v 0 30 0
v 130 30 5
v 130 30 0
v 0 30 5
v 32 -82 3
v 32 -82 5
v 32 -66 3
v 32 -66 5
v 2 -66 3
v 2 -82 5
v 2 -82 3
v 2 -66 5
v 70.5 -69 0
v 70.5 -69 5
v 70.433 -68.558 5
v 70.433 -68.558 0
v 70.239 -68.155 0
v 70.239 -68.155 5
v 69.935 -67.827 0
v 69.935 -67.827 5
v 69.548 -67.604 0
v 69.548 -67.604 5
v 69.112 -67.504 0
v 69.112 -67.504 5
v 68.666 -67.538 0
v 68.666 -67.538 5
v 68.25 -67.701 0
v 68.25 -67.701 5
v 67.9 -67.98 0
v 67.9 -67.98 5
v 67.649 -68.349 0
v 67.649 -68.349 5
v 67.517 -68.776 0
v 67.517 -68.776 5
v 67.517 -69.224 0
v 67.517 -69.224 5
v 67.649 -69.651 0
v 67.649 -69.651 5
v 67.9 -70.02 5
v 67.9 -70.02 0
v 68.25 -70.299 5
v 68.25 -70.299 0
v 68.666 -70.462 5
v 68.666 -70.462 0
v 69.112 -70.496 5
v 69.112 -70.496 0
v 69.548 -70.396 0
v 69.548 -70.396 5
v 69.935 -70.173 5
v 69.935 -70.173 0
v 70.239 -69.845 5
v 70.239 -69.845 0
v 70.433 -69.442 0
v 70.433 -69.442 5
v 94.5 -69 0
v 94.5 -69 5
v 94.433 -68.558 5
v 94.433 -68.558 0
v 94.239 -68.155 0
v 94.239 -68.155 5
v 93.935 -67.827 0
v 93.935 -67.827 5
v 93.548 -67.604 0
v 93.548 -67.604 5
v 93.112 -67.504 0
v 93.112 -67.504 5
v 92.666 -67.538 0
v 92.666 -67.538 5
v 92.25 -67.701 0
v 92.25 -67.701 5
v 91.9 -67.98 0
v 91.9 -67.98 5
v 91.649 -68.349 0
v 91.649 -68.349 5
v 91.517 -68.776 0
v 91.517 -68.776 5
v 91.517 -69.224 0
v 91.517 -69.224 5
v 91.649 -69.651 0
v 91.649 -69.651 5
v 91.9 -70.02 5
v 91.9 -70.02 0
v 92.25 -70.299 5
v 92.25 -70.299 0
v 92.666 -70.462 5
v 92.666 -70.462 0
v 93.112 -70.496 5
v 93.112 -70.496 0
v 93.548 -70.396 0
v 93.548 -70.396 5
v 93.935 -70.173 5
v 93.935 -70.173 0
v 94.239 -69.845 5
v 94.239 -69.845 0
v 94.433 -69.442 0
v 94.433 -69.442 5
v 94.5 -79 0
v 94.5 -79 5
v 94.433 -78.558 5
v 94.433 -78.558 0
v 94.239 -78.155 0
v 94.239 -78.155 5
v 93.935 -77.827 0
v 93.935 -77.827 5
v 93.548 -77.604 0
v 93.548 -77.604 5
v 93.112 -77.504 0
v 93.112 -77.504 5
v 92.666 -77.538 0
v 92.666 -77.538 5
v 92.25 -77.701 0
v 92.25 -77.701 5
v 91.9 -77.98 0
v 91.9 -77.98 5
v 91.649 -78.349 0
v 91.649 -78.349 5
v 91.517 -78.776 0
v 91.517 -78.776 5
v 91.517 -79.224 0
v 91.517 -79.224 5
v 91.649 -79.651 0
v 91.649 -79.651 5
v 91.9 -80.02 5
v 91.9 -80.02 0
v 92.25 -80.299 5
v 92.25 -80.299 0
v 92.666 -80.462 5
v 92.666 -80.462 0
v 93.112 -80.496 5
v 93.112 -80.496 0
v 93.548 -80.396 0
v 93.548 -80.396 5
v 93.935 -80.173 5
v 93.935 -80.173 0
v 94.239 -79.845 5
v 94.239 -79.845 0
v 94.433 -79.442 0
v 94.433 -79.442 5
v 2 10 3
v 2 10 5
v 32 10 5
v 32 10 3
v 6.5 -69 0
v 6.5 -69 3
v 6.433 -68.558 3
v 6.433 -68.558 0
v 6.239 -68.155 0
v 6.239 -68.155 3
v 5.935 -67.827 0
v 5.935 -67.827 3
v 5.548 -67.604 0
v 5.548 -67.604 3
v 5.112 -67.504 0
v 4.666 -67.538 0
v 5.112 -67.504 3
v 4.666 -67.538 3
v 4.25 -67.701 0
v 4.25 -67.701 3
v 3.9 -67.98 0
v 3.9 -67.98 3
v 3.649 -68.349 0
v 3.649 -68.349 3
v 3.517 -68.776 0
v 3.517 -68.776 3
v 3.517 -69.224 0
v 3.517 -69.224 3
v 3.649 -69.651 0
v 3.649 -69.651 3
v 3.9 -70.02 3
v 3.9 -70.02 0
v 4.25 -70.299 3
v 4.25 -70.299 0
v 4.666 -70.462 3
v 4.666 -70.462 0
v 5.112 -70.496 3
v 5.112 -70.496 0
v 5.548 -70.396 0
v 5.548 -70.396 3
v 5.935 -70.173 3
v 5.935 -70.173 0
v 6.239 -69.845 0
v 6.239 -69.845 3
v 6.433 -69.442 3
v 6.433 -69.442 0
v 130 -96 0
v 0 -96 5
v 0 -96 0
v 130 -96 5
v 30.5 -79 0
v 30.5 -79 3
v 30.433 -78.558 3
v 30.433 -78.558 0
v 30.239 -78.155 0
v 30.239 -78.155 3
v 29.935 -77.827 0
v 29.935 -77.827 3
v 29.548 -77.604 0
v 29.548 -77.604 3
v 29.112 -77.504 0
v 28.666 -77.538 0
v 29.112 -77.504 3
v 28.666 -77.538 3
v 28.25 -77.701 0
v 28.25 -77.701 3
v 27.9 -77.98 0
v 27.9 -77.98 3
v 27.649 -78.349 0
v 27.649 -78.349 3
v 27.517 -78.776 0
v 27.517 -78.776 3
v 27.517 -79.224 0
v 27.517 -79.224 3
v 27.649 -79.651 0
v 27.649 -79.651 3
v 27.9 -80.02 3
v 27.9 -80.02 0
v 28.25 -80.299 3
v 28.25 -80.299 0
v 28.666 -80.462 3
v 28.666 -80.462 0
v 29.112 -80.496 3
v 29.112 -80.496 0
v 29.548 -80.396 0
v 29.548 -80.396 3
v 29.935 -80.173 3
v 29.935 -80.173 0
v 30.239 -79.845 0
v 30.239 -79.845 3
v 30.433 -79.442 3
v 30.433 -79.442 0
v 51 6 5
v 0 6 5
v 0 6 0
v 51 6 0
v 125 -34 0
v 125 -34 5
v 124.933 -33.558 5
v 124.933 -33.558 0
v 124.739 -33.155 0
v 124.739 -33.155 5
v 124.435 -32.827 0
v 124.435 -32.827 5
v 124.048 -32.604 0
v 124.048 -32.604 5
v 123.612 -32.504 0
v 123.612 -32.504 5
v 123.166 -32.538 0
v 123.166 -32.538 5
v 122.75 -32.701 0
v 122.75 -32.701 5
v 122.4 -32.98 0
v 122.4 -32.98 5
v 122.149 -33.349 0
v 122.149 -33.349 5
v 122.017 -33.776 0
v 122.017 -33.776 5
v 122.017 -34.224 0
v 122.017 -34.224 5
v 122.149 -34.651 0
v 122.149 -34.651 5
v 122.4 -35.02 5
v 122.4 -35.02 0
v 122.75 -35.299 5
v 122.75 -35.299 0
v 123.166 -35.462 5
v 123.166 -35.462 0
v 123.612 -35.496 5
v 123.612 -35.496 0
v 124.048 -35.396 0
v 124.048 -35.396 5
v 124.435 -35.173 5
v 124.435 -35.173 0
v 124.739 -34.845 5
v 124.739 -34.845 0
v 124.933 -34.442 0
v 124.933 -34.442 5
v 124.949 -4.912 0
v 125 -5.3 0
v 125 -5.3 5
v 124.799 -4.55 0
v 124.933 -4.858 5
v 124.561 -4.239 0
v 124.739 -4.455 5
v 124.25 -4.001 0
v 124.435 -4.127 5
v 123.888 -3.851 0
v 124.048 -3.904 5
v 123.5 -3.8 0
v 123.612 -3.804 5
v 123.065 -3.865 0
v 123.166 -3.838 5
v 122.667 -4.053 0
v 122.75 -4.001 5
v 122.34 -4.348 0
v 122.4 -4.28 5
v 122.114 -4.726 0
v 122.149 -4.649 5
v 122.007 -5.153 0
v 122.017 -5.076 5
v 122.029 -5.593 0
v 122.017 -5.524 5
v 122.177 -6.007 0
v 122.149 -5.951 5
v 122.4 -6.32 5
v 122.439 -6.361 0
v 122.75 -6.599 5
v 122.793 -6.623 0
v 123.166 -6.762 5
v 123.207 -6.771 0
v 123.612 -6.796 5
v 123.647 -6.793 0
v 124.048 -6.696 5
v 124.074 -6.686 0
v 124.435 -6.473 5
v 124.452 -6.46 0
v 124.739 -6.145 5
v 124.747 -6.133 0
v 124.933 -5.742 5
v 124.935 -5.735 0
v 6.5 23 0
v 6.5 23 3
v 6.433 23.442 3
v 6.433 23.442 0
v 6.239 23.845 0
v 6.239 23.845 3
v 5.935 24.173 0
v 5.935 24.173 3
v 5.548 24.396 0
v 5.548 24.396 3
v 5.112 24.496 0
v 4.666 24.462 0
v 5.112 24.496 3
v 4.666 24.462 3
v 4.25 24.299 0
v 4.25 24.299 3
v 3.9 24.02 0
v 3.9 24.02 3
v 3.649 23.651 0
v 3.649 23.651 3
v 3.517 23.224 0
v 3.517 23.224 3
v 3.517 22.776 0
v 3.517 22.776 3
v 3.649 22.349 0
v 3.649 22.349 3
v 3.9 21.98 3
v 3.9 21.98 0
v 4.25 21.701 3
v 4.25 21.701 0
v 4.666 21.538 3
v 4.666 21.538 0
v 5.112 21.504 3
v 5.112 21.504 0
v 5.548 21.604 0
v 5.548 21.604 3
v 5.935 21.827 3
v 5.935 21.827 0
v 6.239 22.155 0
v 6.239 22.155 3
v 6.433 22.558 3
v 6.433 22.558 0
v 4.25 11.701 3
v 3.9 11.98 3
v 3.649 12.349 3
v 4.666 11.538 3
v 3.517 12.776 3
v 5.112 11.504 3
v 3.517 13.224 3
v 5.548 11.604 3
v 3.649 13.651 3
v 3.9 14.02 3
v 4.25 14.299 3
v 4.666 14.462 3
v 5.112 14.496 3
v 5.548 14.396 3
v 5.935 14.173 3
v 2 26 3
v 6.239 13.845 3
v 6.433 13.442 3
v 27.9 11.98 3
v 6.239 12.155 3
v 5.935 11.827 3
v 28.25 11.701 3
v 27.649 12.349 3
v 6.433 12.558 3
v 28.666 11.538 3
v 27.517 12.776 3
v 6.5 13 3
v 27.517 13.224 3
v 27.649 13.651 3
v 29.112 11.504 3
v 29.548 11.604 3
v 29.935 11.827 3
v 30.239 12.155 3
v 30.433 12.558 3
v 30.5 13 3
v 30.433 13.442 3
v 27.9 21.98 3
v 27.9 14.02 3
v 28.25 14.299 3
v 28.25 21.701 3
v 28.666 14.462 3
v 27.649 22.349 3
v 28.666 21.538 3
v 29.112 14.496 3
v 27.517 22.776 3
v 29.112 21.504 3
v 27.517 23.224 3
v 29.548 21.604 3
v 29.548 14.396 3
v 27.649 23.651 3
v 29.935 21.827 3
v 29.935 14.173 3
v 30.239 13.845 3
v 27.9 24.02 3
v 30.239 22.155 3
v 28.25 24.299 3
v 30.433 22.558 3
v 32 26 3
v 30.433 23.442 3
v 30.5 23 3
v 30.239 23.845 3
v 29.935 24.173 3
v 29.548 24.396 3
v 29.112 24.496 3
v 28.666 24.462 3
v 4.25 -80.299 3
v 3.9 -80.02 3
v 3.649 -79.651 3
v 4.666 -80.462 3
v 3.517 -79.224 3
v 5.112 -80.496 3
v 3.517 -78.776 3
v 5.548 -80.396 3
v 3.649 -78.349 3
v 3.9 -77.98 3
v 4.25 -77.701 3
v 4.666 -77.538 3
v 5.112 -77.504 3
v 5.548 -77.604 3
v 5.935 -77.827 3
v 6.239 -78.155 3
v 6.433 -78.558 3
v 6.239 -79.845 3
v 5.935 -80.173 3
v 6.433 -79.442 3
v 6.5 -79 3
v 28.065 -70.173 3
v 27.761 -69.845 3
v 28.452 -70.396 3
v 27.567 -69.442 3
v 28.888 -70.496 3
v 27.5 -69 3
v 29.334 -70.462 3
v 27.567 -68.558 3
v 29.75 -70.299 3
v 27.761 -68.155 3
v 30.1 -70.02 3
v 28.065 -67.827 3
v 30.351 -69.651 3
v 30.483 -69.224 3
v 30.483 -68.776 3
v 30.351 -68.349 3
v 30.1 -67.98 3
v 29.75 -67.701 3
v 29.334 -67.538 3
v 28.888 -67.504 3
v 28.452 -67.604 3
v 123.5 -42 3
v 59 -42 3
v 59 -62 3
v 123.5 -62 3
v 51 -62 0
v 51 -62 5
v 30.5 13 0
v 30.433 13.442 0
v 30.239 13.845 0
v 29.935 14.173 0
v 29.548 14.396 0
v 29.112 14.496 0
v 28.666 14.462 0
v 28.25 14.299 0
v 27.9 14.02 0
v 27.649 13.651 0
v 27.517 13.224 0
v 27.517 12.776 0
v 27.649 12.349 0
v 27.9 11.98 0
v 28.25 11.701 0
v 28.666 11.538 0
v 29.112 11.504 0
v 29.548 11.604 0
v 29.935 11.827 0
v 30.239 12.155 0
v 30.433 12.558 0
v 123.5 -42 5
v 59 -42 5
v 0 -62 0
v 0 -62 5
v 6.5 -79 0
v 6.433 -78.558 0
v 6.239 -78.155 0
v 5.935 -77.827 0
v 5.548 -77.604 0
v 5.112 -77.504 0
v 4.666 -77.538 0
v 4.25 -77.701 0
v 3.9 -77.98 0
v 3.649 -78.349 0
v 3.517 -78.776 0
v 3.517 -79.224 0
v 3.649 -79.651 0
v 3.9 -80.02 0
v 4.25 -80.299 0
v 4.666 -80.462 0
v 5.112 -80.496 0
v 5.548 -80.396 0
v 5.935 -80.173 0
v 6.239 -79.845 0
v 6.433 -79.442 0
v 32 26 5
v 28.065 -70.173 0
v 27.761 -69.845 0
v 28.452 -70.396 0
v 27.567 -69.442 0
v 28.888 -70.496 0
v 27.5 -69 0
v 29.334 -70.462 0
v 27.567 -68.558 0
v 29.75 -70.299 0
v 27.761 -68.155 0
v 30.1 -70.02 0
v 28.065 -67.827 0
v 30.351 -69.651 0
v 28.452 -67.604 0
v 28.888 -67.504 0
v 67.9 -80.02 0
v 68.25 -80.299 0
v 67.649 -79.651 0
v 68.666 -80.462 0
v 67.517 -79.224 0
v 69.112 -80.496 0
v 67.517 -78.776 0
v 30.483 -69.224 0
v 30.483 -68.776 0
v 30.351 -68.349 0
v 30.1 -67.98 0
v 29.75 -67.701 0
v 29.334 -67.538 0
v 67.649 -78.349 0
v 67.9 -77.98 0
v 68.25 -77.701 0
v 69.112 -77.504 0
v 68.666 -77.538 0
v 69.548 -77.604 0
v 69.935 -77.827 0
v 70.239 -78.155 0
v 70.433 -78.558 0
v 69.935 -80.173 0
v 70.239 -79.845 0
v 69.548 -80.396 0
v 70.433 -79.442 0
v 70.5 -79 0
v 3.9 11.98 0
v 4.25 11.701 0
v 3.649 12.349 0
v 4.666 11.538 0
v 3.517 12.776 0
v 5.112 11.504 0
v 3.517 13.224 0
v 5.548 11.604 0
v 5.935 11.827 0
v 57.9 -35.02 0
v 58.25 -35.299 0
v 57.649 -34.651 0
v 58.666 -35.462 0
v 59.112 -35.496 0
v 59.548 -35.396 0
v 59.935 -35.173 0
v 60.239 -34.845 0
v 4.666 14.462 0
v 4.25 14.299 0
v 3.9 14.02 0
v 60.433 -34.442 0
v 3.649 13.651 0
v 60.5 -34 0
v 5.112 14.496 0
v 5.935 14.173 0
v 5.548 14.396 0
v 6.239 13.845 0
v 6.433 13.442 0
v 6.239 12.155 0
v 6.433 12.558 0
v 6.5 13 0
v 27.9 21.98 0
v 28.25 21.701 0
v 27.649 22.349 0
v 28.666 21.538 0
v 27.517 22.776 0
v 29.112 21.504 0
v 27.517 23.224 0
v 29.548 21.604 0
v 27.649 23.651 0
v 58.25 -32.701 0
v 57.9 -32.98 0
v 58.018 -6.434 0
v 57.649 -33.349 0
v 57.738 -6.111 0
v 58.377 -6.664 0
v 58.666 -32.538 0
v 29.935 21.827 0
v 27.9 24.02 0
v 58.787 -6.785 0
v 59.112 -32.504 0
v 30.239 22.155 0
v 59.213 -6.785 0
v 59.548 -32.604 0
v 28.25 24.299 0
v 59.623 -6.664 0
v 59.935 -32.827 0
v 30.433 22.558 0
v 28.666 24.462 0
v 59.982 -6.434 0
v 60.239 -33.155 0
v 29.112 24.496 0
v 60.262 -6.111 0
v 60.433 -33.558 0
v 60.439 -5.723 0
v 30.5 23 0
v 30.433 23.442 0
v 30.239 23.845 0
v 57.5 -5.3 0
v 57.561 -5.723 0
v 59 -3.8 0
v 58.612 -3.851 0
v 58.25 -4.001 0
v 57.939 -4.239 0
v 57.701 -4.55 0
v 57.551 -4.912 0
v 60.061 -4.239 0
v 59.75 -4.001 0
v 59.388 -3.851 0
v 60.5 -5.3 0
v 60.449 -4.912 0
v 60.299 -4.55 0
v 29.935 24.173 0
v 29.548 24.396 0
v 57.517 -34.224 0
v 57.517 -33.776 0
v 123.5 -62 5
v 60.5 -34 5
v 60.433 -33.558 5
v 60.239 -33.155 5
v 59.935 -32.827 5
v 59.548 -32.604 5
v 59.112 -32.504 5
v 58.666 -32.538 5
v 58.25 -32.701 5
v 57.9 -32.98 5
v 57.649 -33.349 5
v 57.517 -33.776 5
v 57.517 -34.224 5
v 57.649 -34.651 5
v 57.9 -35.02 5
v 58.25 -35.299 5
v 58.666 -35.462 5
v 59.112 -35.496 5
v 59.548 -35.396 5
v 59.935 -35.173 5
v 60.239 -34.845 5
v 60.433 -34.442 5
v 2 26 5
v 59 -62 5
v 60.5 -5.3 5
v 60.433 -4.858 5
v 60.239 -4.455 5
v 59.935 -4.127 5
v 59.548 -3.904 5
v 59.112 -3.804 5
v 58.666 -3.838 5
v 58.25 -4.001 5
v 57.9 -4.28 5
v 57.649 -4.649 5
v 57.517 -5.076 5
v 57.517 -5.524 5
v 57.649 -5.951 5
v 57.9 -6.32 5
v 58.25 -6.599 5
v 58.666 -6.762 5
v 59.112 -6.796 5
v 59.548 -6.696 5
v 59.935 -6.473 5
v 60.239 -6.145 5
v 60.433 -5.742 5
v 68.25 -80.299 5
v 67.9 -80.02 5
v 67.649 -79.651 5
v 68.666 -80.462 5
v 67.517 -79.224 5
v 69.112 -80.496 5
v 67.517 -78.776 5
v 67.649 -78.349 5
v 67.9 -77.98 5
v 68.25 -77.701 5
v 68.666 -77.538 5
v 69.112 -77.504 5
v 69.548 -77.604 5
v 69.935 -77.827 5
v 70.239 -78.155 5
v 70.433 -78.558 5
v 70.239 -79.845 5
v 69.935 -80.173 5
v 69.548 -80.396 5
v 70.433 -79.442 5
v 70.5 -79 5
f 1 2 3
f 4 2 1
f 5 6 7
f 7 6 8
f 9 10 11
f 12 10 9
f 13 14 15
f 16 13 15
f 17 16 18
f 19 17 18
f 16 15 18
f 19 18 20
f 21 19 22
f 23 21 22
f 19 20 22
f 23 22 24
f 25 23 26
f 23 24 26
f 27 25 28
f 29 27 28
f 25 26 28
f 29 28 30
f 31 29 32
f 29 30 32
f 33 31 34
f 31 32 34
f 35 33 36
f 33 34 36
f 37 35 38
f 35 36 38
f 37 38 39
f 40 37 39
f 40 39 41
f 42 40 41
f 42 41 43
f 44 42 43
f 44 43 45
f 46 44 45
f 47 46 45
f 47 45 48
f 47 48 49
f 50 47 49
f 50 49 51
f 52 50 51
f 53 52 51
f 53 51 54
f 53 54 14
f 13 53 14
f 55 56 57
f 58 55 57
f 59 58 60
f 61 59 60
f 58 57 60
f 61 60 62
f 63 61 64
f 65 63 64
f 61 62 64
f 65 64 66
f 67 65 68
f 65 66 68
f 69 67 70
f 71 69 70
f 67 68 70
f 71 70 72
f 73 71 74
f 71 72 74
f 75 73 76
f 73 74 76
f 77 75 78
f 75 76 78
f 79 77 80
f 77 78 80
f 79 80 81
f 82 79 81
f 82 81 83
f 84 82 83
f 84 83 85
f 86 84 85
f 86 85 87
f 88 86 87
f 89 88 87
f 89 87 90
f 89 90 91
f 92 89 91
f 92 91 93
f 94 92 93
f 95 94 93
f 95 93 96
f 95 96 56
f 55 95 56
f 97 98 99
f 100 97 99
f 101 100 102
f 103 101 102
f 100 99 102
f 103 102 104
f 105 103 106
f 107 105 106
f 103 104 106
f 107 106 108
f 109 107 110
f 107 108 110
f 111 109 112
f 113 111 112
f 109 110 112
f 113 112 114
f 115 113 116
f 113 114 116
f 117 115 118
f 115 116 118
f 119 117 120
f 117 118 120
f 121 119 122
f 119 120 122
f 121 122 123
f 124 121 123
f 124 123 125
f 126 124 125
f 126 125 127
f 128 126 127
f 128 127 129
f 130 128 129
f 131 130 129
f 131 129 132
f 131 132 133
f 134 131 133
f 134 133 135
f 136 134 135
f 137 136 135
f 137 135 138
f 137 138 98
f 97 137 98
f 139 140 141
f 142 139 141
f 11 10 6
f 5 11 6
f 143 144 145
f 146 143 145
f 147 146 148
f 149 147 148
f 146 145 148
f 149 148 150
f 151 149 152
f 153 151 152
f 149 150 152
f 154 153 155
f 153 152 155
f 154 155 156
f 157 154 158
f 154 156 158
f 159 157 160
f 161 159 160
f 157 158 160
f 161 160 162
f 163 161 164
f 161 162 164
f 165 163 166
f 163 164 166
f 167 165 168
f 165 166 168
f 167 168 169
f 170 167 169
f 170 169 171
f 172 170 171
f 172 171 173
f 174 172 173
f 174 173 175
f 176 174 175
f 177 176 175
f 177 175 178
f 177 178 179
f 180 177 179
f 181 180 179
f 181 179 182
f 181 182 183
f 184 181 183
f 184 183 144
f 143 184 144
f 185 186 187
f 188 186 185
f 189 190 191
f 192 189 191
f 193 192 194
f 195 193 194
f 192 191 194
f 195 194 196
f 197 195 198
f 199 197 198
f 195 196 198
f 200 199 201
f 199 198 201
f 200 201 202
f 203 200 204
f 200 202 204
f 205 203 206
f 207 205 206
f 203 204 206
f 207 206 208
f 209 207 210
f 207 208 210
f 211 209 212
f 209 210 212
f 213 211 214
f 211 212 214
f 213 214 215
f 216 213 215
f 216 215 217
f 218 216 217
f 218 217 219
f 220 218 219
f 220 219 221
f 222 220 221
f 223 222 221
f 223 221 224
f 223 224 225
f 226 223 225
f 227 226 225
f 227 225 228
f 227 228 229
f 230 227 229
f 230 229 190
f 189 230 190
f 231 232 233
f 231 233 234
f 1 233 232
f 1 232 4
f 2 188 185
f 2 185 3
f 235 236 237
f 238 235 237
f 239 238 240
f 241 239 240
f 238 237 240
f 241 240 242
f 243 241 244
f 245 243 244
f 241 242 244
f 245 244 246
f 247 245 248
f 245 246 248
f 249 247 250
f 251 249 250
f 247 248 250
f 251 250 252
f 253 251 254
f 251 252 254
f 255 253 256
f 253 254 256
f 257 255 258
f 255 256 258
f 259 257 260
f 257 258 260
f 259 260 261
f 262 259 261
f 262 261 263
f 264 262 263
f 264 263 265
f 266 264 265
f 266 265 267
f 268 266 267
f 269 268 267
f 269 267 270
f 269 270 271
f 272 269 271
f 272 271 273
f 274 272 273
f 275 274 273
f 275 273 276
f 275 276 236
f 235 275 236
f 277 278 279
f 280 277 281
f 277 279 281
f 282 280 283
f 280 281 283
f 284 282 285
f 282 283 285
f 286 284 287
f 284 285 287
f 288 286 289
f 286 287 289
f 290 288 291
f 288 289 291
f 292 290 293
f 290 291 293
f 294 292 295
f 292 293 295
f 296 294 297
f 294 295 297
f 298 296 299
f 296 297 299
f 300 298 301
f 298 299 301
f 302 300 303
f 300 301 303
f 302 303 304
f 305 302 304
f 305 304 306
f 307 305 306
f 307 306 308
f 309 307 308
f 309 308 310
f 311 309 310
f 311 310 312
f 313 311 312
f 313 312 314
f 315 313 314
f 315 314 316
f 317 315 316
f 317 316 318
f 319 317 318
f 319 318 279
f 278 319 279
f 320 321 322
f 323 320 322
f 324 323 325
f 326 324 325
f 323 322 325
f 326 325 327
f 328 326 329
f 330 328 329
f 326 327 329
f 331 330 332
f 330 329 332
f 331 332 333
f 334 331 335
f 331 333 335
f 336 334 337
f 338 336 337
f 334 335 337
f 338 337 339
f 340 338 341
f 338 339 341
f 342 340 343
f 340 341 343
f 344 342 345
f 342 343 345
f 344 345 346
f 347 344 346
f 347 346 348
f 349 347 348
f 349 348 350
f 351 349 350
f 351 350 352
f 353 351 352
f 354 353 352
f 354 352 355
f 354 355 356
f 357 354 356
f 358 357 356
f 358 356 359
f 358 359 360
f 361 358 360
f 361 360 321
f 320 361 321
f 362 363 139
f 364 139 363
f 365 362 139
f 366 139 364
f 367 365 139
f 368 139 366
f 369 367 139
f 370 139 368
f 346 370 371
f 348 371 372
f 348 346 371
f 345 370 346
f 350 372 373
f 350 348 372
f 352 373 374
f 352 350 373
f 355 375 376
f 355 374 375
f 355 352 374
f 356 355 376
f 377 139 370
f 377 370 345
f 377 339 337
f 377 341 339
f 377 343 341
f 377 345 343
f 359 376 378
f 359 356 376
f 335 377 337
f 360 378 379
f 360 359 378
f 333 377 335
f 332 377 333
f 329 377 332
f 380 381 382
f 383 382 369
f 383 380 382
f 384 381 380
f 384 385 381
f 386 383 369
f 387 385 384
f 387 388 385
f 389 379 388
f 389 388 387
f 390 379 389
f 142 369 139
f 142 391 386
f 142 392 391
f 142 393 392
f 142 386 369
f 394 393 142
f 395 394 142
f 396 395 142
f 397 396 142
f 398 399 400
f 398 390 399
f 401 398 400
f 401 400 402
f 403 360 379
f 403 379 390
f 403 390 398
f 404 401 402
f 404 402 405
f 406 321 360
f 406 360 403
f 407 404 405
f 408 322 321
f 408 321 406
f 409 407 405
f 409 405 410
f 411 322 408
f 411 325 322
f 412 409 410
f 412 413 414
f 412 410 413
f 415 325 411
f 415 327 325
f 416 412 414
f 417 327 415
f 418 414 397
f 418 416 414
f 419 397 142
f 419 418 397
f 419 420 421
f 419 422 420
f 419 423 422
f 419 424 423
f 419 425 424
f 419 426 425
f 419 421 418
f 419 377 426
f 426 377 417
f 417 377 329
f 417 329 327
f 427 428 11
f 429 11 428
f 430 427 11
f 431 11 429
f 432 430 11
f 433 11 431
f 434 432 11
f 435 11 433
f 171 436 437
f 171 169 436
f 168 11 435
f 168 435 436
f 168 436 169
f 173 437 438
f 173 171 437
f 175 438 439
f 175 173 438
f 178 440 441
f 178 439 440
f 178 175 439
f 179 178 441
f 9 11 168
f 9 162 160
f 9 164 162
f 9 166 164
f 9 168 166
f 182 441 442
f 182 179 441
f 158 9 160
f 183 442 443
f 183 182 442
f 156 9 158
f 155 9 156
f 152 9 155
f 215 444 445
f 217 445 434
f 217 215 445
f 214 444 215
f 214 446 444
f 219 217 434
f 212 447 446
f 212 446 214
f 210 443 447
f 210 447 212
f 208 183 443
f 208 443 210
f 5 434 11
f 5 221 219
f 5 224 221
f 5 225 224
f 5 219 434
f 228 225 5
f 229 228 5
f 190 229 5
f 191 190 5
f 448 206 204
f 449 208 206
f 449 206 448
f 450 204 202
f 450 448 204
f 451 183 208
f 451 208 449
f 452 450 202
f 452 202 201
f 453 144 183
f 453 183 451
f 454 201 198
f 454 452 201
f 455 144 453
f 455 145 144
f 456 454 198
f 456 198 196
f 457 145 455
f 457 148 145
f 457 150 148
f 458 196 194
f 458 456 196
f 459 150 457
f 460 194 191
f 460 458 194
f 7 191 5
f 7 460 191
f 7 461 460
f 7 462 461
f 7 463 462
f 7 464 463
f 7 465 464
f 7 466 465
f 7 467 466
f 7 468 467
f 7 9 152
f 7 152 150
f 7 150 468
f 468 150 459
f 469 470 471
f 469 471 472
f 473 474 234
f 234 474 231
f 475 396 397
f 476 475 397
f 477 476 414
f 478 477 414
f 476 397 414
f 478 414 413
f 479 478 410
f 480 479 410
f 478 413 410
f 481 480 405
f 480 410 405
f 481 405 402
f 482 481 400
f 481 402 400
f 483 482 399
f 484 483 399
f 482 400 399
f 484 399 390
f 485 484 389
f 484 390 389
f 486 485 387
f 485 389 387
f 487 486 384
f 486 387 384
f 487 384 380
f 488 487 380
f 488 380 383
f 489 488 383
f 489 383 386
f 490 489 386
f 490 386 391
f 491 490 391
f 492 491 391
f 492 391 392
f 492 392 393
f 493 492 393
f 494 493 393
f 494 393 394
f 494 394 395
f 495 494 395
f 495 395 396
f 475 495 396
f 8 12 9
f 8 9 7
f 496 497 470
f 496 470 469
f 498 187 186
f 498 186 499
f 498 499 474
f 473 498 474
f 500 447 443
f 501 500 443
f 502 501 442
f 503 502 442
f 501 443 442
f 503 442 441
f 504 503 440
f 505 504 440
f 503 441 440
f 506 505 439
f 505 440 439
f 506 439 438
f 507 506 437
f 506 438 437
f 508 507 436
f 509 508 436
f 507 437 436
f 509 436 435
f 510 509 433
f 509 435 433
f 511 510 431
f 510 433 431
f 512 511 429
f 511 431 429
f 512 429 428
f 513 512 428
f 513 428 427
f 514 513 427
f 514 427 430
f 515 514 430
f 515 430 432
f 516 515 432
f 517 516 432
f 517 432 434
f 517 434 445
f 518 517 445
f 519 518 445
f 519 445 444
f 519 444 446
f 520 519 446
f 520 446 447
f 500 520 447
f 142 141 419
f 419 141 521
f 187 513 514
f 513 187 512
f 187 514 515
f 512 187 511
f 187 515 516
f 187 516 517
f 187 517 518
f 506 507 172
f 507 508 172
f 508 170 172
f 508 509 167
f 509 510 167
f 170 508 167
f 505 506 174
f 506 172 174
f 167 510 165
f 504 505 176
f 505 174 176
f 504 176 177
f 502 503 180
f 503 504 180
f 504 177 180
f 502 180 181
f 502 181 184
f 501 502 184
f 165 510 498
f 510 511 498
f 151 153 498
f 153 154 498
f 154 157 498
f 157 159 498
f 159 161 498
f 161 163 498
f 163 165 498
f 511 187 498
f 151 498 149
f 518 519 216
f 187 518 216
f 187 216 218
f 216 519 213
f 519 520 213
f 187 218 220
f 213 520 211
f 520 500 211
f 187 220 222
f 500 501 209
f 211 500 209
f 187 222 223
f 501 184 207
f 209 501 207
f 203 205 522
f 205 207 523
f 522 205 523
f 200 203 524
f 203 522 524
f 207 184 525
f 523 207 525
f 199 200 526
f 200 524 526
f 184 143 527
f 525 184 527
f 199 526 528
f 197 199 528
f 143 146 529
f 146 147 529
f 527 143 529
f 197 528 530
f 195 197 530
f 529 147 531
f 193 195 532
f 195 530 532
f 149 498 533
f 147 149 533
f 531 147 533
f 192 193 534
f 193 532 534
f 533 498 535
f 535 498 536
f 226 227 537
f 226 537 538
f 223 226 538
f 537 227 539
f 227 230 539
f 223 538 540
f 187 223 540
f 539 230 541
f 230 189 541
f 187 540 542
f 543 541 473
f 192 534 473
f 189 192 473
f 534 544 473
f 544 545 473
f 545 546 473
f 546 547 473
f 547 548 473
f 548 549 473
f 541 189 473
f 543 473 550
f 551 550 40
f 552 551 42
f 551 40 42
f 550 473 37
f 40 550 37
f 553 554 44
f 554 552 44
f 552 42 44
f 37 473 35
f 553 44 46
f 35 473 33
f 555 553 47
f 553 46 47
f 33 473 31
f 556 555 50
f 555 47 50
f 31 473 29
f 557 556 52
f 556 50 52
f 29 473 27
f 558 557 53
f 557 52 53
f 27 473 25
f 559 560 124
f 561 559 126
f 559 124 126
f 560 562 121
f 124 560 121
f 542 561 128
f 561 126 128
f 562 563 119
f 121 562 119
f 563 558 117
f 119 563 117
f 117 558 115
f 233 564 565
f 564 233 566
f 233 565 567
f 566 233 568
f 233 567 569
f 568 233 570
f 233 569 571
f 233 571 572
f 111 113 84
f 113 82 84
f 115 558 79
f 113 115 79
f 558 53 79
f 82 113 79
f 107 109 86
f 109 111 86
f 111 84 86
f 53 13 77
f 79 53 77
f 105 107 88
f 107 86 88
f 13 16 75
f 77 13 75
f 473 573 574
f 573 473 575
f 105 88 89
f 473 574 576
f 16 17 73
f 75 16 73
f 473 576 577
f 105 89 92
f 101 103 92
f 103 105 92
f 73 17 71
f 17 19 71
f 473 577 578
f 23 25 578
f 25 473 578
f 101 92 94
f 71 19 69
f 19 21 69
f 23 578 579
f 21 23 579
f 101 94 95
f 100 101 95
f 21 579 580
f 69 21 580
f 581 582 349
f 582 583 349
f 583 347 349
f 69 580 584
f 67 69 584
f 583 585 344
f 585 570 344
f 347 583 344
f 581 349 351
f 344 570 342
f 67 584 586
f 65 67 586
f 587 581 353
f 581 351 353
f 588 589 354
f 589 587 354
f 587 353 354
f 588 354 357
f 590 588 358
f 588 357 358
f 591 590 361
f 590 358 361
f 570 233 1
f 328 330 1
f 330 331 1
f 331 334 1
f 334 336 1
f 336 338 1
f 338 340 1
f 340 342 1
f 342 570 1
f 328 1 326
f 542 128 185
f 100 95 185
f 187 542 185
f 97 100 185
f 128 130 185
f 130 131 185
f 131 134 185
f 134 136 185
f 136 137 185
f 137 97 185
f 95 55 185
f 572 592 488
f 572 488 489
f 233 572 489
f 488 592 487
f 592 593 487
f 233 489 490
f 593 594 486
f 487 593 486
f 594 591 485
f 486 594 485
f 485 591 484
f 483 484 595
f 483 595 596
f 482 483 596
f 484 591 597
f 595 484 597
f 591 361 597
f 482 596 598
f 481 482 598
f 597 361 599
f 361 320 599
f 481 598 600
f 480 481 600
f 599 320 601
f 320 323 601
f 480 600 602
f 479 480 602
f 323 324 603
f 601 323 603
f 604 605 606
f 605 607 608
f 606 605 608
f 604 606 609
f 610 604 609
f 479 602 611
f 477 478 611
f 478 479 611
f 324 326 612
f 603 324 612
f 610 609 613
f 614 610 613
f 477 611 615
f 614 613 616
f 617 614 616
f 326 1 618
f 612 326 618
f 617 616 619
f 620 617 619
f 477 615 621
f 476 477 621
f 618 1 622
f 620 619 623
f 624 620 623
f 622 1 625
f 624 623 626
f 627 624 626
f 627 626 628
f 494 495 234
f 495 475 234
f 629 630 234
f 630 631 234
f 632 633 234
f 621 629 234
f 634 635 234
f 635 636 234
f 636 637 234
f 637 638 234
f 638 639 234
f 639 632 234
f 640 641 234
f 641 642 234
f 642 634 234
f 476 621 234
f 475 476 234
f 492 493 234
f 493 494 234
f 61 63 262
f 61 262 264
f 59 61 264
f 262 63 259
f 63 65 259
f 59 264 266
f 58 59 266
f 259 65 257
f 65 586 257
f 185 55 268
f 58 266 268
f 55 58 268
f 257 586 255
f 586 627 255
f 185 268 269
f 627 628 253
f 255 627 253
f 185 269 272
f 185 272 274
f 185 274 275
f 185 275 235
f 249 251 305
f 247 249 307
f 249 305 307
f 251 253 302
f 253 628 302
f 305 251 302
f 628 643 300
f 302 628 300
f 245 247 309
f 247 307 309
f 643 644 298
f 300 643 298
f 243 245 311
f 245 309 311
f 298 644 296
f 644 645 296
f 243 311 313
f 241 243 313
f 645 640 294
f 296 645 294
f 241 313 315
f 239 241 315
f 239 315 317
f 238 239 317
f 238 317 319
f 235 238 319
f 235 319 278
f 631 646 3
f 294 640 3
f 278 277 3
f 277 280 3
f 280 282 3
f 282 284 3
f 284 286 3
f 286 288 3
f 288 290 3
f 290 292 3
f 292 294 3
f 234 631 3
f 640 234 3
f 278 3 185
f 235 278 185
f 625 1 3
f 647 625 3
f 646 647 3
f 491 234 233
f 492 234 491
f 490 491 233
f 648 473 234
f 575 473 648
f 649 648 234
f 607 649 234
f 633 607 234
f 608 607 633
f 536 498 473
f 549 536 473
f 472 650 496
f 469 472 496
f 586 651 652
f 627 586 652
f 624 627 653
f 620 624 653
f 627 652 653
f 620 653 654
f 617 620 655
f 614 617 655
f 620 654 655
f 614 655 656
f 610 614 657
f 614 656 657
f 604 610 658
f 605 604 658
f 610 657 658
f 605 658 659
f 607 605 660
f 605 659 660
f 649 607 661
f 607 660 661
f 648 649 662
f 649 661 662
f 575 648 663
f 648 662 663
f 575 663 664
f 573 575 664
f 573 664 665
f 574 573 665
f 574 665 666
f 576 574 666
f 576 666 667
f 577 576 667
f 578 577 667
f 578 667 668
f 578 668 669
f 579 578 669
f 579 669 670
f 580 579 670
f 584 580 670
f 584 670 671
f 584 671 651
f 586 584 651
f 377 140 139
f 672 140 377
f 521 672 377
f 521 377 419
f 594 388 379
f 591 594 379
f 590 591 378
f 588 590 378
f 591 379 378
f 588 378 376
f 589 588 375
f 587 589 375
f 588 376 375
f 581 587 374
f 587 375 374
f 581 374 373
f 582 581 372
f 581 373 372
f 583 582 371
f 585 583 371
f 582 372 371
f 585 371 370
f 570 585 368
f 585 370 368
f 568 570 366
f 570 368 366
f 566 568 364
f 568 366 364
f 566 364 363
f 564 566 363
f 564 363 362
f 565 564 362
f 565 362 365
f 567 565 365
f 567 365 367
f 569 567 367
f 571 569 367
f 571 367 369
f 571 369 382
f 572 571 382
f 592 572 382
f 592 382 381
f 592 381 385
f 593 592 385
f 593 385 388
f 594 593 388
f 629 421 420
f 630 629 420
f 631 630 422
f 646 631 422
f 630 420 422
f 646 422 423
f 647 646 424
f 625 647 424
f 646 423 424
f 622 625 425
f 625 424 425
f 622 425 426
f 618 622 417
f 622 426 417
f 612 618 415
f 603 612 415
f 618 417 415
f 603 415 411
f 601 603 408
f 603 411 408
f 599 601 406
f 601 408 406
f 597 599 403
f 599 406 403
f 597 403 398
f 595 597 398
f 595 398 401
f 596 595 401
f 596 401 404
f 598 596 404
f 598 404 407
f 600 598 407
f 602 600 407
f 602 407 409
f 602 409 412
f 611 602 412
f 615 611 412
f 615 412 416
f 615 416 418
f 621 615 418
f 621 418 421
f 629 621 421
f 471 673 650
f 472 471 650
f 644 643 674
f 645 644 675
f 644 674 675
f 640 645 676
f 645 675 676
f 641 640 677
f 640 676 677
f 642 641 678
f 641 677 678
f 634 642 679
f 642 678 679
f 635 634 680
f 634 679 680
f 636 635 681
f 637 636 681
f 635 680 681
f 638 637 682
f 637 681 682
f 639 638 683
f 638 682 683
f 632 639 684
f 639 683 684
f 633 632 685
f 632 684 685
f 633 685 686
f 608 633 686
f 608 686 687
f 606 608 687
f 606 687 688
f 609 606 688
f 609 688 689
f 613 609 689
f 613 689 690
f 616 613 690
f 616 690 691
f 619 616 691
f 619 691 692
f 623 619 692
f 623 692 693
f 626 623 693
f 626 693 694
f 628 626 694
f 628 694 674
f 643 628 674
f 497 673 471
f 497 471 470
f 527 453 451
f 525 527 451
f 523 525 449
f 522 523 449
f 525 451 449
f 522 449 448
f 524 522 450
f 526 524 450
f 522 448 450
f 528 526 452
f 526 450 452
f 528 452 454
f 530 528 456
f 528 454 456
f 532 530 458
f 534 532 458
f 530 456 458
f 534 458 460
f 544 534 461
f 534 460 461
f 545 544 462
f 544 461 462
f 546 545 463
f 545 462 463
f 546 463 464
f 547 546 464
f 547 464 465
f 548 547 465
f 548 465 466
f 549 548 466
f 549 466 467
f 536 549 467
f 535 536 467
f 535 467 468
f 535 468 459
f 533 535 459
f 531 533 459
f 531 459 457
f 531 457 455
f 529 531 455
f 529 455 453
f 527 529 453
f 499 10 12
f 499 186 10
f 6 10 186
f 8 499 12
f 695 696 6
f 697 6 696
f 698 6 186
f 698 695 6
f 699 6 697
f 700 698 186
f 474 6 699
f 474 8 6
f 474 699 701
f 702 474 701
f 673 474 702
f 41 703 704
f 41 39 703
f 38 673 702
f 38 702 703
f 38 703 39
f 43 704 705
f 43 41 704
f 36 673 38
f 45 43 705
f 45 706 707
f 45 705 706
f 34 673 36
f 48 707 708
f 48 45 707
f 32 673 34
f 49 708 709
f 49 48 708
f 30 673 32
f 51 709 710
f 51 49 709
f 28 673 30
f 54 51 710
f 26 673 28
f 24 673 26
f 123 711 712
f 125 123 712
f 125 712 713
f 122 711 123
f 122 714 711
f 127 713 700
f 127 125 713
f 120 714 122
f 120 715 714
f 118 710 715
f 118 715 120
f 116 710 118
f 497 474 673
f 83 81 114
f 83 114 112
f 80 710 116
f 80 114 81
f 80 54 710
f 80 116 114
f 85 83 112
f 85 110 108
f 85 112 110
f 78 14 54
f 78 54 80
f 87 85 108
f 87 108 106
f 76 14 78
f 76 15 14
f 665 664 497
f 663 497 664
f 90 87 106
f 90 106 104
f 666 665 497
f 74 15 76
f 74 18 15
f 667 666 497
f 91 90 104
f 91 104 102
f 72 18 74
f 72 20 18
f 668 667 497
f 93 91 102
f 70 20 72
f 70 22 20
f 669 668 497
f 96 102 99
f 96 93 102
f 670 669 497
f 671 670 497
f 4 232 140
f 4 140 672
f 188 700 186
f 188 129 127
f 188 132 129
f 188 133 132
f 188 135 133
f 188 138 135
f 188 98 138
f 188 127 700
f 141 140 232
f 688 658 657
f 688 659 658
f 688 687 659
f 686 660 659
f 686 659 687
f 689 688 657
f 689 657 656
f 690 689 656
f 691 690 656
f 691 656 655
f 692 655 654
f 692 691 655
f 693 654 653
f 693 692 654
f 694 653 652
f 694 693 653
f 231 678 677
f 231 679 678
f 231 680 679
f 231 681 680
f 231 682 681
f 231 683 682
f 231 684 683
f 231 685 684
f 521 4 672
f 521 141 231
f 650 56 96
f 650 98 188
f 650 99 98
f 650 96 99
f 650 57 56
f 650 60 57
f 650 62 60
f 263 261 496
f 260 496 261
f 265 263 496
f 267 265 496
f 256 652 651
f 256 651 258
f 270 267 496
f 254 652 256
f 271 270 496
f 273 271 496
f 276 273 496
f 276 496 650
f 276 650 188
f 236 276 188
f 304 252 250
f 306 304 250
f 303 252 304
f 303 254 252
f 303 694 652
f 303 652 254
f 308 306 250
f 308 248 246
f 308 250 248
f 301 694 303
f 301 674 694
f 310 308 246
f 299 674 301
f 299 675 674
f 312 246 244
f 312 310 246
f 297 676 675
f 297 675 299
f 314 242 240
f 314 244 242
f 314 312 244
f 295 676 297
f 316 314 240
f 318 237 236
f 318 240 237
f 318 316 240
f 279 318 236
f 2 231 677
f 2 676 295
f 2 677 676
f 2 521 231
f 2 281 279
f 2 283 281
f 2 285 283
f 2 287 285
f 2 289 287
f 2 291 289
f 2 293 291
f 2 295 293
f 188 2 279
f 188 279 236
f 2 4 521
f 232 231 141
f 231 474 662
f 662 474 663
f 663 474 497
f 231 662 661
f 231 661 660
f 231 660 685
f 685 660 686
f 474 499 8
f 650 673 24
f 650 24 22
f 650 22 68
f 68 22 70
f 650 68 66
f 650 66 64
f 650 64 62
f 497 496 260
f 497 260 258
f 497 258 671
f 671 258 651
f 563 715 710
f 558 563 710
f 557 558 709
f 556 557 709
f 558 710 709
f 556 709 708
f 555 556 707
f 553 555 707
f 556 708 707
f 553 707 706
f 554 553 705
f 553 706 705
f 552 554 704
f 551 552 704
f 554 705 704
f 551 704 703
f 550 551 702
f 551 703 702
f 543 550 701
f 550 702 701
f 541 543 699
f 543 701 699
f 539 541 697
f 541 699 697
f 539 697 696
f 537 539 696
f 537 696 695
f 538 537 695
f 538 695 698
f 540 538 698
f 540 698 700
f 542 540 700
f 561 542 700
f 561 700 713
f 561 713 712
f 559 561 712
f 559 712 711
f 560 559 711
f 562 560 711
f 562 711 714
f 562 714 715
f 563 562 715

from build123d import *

# Parameters (mm, degrees)
EXTRUDE_2_DEPTH      = 5
SKETCH_3_W           = 30
SKETCH_3_H           = 16.1
CUT_EXTRUDE_1_DEPTH  = 2
CUT_EXTRUDE_2_REACH  = 155.704
SKETCH_4_R           = 1.55
CUT_EXTRUDE_3_REACH  = 155.756
SKETCH_5_W           = 32
SKETCH_5_H           = 56
SKETCH_7_W           = 40.5
SKETCH_7_H           = 40.5
EXTRUDE_4_DEPTH      = 2
SKETCH_8_W           = 30.5
SKETCH_8_H           = 16.5
CUT_EXTRUDE_4_DEPTH  = 2
SKETCH_9_R           = 1.55
CUT_EXTRUDE_6_DEPTH  = 154.727030805
SKETCH_10_W          = 60
SKETCH_10_H          = 45
EXTRUDE_5_DEPTH      = 2
SKETCH_11_W          = 60
SKETCH_11_H          = 45
CUT_EXTRUDE_8_DEPTH  = 2
SKETCH_12_W          = 30
SKETCH_12_H          = 16.1
SKETCH_12_W_2        = 30.5
SKETCH_12_H_2        = 16.5
EXTRUDE_6_DEPTH      = 5
SKETCH_13_R          = 1.5
CUT_EXTRUDE_10_DEPTH = 5
SKETCH_14_W          = 30
SKETCH_14_H          = 16
CUT_EXTRUDE_11_DEPTH = 2
SKETCH_15_W          = 53
SKETCH_15_H          = 60
SKETCH_15_W_2        = 49
SKETCH_15_H_2        = 56
CUT_EXTRUDE_12_DEPTH = 5
SKETCH_16_W          = 30
SKETCH_16_H          = 16
CUT_EXTRUDE_13_DEPTH = 2
SKETCH_17_R          = 1.5
CUT_EXTRUDE_15_DEPTH = 154.704261489
EXTRUDE_7_DEPTH      = 5
SKETCH_19_W          = 30
SKETCH_19_H          = 16
EXTRUDE_8_DEPTH      = 5
SKETCH_20_W          = 72
SKETCH_20_H          = 36.7
SKETCH_20_W_2        = 30
SKETCH_20_H_2        = 16
CUT_EXTRUDE_17_DEPTH = 2
SKETCH_21_R          = 1.5
CUT_EXTRUDE_18_DEPTH = 162.632298752
SKETCH_22_R          = 1.5
EXTRUDE_10_DEPTH     = 3
SKETCH_23_R          = 1.5
CUT_EXTRUDE_19_DEPTH = 162.632298752
SKETCH_24_W          = 72
SKETCH_24_H          = 36.7
SKETCH_24_R          = 1.5
EXTRUDE_11_DEPTH     = 5
SKETCH_26_W          = 30
SKETCH_26_H          = 16
SKETCH_26_R          = 1.5
EXTRUDE_12_DEPTH     = 5
SKETCH_27_W          = 51
SKETCH_27_H          = 4
CUT_EXTRUDE_22_DEPTH = 5
SKETCH_29_W          = 64.5
SKETCH_29_H          = 20
CUT_EXTRUDE_24_DEPTH = 2


with BuildPart() as part:
    # 草图1 → 凸台-拉伸2 (new body)
    with BuildSketch(Plane.XY):
        Polygon((0, 0), (0, 30), (120, 30), (120, -96), (0, -96), (0, -56), (45, -56), (45, 0), align=None)
    extrude(amount=EXTRUDE_2_DEPTH)

    # 草图3 → 切除-拉伸1 (cut)
    with BuildSketch(Plane.XY.offset(5)):
        with Locations((17, 10)):
            Rectangle(SKETCH_3_W, SKETCH_3_H)
        with Locations((17, -66)):
            Rectangle(SKETCH_3_W, SKETCH_3_H)
    extrude(amount=-CUT_EXTRUDE_1_DEPTH, mode=Mode.SUBTRACT)

    # 草图4 → 切除-拉伸2 (cut, up to next)
    with BuildSketch(Plane.XY.offset(3), mode=Mode.PRIVATE) as cut_extrude_2_sk1:
        with Locations((29, 15)):
            Circle(SKETCH_4_R)
    cut_extrude_2_tool1 = extrude(cut_extrude_2_sk1.sketch, amount=-CUT_EXTRUDE_2_REACH, mode=Mode.PRIVATE) & part.part
    # 草图4 → 切除-拉伸2 (cut, up to next)
    with BuildSketch(Plane.XY.offset(3), mode=Mode.PRIVATE) as cut_extrude_2_sk2:
        with Locations((29, 5)):
            Circle(SKETCH_4_R)
    cut_extrude_2_tool2 = extrude(cut_extrude_2_sk2.sketch, amount=-CUT_EXTRUDE_2_REACH, mode=Mode.PRIVATE) & part.part
    # 草图4 → 切除-拉伸2 (cut, up to next)
    with BuildSketch(Plane.XY.offset(3), mode=Mode.PRIVATE) as cut_extrude_2_sk3:
        with BuildLine():
            ThreePointArc((5, 16.55), (3.903984489, 16.096015511), (3.45, 15))
            Line((3.45, 15), (5, 15))
            Line((5, 15), (5, 16.55))
        make_face()
    cut_extrude_2_tool3 = extrude(cut_extrude_2_sk3.sketch, amount=-CUT_EXTRUDE_2_REACH, mode=Mode.PRIVATE) & part.part
    # 草图4 → 切除-拉伸2 (cut, up to next)
    with BuildSketch(Plane.XY.offset(3), mode=Mode.PRIVATE) as cut_extrude_2_sk4:
        with BuildLine():
            Line((5, 15), (3.45, 15))
            ThreePointArc((3.45, 15), (5, 13.45), (6.55, 15))
            ThreePointArc((6.55, 15), (6.096015511, 16.096015511), (5, 16.55))
            Line((5, 16.55), (5, 15))
        make_face()
    cut_extrude_2_tool4 = extrude(cut_extrude_2_sk4.sketch, amount=-CUT_EXTRUDE_2_REACH, mode=Mode.PRIVATE) & part.part
    # 草图4 → 切除-拉伸2 (cut, up to next)
    with BuildSketch(Plane.XY.offset(3), mode=Mode.PRIVATE) as cut_extrude_2_sk5:
        with BuildLine():
            ThreePointArc((5, 16.55), (3.903984489, 16.096015511), (3.45, 15))
            Line((3.45, 15), (5, 15))
            Line((5, 15), (5, 16.55))
        make_face()
    cut_extrude_2_tool5 = extrude(cut_extrude_2_sk5.sketch, amount=-CUT_EXTRUDE_2_REACH, mode=Mode.PRIVATE) & part.part
    # 草图4 → 切除-拉伸2 (cut, up to next)
    with BuildSketch(Plane.XY.offset(3), mode=Mode.PRIVATE) as cut_extrude_2_sk6:
        with BuildLine():
            Line((5, 15), (3.45, 15))
            ThreePointArc((3.45, 15), (5, 13.45), (6.55, 15))
            ThreePointArc((6.55, 15), (6.096015511, 16.096015511), (5, 16.55))
            Line((5, 16.55), (5, 15))
        make_face()
    cut_extrude_2_tool6 = extrude(cut_extrude_2_sk6.sketch, amount=-CUT_EXTRUDE_2_REACH, mode=Mode.PRIVATE) & part.part
    # 草图4 → 切除-拉伸2 (cut, up to next)
    with BuildSketch(Plane.XY.offset(3), mode=Mode.PRIVATE) as cut_extrude_2_sk7:
        with Locations((5, 5)):
            Circle(SKETCH_4_R)
    cut_extrude_2_tool7 = extrude(cut_extrude_2_sk7.sketch, amount=-CUT_EXTRUDE_2_REACH, mode=Mode.PRIVATE) & part.part
    # 草图4 → 切除-拉伸2 (cut, up to next)
    with BuildSketch(Plane.XY.offset(3), mode=Mode.PRIVATE) as cut_extrude_2_sk8:
        with Locations((5, -61)):
            Circle(SKETCH_4_R)
    cut_extrude_2_tool8 = extrude(cut_extrude_2_sk8.sketch, amount=-CUT_EXTRUDE_2_REACH, mode=Mode.PRIVATE) & part.part
    # 草图4 → 切除-拉伸2 (cut, up to next)
    with BuildSketch(Plane.XY.offset(3), mode=Mode.PRIVATE) as cut_extrude_2_sk9:
        with Locations((5, -71)):
            Circle(SKETCH_4_R)
    cut_extrude_2_tool9 = extrude(cut_extrude_2_sk9.sketch, amount=-CUT_EXTRUDE_2_REACH, mode=Mode.PRIVATE) & part.part
    # 草图4 → 切除-拉伸2 (cut, up to next)
    with BuildSketch(Plane.XY.offset(3), mode=Mode.PRIVATE) as cut_extrude_2_sk10:
        with Locations((29, -61)):
            Circle(SKETCH_4_R)
    cut_extrude_2_tool10 = extrude(cut_extrude_2_sk10.sketch, amount=-CUT_EXTRUDE_2_REACH, mode=Mode.PRIVATE) & part.part
    # 草图4 → 切除-拉伸2 (cut, up to next)
    with BuildSketch(Plane.XY.offset(3), mode=Mode.PRIVATE) as cut_extrude_2_sk11:
        with Locations((29, -71)):
            Circle(SKETCH_4_R)
    cut_extrude_2_tool11 = extrude(cut_extrude_2_sk11.sketch, amount=-CUT_EXTRUDE_2_REACH, mode=Mode.PRIVATE) & part.part
    add(cut_extrude_2_tool1.solids().sort_by_distance((29, 15, 3))[0], mode=Mode.SUBTRACT)
    add(cut_extrude_2_tool2.solids().sort_by_distance((29, 5, 3))[0], mode=Mode.SUBTRACT)
    add(cut_extrude_2_tool3.solids().sort_by_distance((4.34216, 15.65784, 3))[0], mode=Mode.SUBTRACT)
    add(cut_extrude_2_tool4.solids().sort_by_distance((5.21928, 14.78072, 3))[0], mode=Mode.SUBTRACT)
    add(cut_extrude_2_tool5.solids().sort_by_distance((4.34216, 15.65784, 3))[0], mode=Mode.SUBTRACT)
    add(cut_extrude_2_tool6.solids().sort_by_distance((5.21928, 14.78072, 3))[0], mode=Mode.SUBTRACT)
    add(cut_extrude_2_tool7.solids().sort_by_distance((5, 5, 3))[0], mode=Mode.SUBTRACT)
    add(cut_extrude_2_tool8.solids().sort_by_distance((5, -61, 3))[0], mode=Mode.SUBTRACT)
    add(cut_extrude_2_tool9.solids().sort_by_distance((5, -71, 3))[0], mode=Mode.SUBTRACT)
    add(cut_extrude_2_tool10.solids().sort_by_distance((29, -61, 3))[0], mode=Mode.SUBTRACT)
    add(cut_extrude_2_tool11.solids().sort_by_distance((29, -71, 3))[0], mode=Mode.SUBTRACT)

    # 草图5 → 切除-拉伸3 (cut, up to next)
    with BuildSketch(Plane.XY.offset(5), mode=Mode.PRIVATE) as cut_extrude_3_sk1:
        with Locations((33, -28)):
            Rectangle(SKETCH_5_W, SKETCH_5_H)
    cut_extrude_3_tool1 = extrude(cut_extrude_3_sk1.sketch, amount=-CUT_EXTRUDE_3_REACH, mode=Mode.PRIVATE) & part.part
    add(cut_extrude_3_tool1.solids().sort_by_distance((33, -28, 5))[0], mode=Mode.SUBTRACT)

    # 草图7 → 凸台-拉伸4 (add)
    with BuildSketch(Plane.XY.offset(5)):
        with Locations((79.25, -35.75)):
            Rectangle(SKETCH_7_W, SKETCH_7_H)
    extrude(amount=EXTRUDE_4_DEPTH)

    # 草图8 → 切除-拉伸4 (cut)
    with BuildSketch(Plane.XY.offset(5)):
        with Locations((69.5, -70.5)):
            Rectangle(SKETCH_8_W, SKETCH_8_H)
    extrude(amount=-CUT_EXTRUDE_4_DEPTH, mode=Mode.SUBTRACT)

    # 草图9 → 切除-拉伸6 (cut, through all)
    with BuildSketch(Plane.XY.offset(3)):
        with Locations((81.5, -65.5)):
            Circle(SKETCH_9_R)
        with Locations((57.5, -65.5)):
            Circle(SKETCH_9_R)
        with Locations(Location((57.5, -75.5, 0), (0, 0, 180))):
            Circle(SKETCH_9_R)
        with Locations((81.5, -75.5)):
            Circle(SKETCH_9_R)
    extrude(amount=-CUT_EXTRUDE_6_DEPTH, mode=Mode.SUBTRACT)

    # 草图10 → 凸台-拉伸5 (add)
    with BuildSketch(Plane.XY.offset(7)):
        with Locations((89, -33.5)):
            Rectangle(SKETCH_10_W, SKETCH_10_H)
    extrude(amount=-EXTRUDE_5_DEPTH)

    # 草图11 → 切除-拉伸8 (cut)
    with BuildSketch(Plane.XY.offset(5)):
        with Locations((89, -33.5)):
            Rectangle(SKETCH_11_W, SKETCH_11_H)
    extrude(amount=CUT_EXTRUDE_8_DEPTH, mode=Mode.SUBTRACT)

    # 草图12 → 凸台-拉伸6 (add)
    with BuildSketch(Plane.XY.offset(5)):
        with Locations((17, 10)):
            Rectangle(SKETCH_12_W, SKETCH_12_H)
        with Locations((17, -66)):
            Rectangle(SKETCH_12_W, SKETCH_12_H)
        with Locations((69.5, -70.5)):
            Rectangle(SKETCH_12_W_2, SKETCH_12_H_2)
    extrude(amount=-EXTRUDE_6_DEPTH)

    # 草图13 → 切除-拉伸10 (cut)
    with BuildSketch(Plane.XY.offset(5)):
        with Locations((5, -69)):
            Circle(SKETCH_13_R)
        with Locations((5, -79)):
            Circle(SKETCH_13_R)
        with Locations((29, 13)):
            Circle(SKETCH_13_R)
        with Locations((29, 23)):
            Circle(SKETCH_13_R)
        with Locations((5, 13)):
            Circle(SKETCH_13_R)
        with Locations((29, -79)):
            Circle(SKETCH_13_R)
        with Locations(Location((29, -69, 0), (0, 0, 180))):
            Circle(SKETCH_13_R)
        with Locations((5, 23)):
            Circle(SKETCH_13_R)
    extrude(amount=-CUT_EXTRUDE_10_DEPTH, mode=Mode.SUBTRACT)

    # 草图14 → 切除-拉伸11 (cut)
    with BuildSketch(Plane.XY.offset(5)):
        with Locations((17, 18)):
            Rectangle(SKETCH_14_W, SKETCH_14_H)
        with Locations((17, -74)):
            Rectangle(SKETCH_14_W, SKETCH_14_H)
    extrude(amount=-CUT_EXTRUDE_11_DEPTH, mode=Mode.SUBTRACT)

    # 草图15 → 切除-拉伸12 (cut)
    with BuildSketch(Plane.XY.offset(5)):
        with Locations((24.5, -28)):
            Rectangle(SKETCH_15_W, SKETCH_15_H)
        with Locations((24.5, -28)):
            Rectangle(SKETCH_15_W_2, SKETCH_15_H_2, mode=Mode.SUBTRACT)
    extrude(amount=-CUT_EXTRUDE_12_DEPTH, mode=Mode.SUBTRACT)

    # 草图16 → 切除-拉伸13 (cut)
    with BuildSketch(Plane.XY.offset(5)):
        with Locations((76, -74)):
            Rectangle(SKETCH_16_W, SKETCH_16_H)
    extrude(amount=-CUT_EXTRUDE_13_DEPTH, mode=Mode.SUBTRACT)

    # 草图17 → 切除-拉伸15 (cut, through all)
    with BuildSketch(Plane.XY.offset(3)):
        with Locations((88, -69)):
            Circle(SKETCH_17_R)
        with Locations((88, -79)):
            Circle(SKETCH_17_R)
        with Locations((64, -79)):
            Circle(SKETCH_17_R)
        with Locations((64, -69)):
            Circle(SKETCH_17_R)
    extrude(amount=-CUT_EXTRUDE_15_DEPTH, mode=Mode.SUBTRACT)

    # 草图18 → 凸台-拉伸7 (add)
    with BuildSketch(Plane.XY.offset(5)):
        Polygon((120, 30), (120, -46), (120, -96), (130, -96), (130, 30), align=None)
    extrude(amount=-EXTRUDE_7_DEPTH)

    # 草图19 → 凸台-拉伸8 (add)
    with BuildSketch(Plane.XY.offset(5)):
        with Locations((76, -74)):
            Rectangle(SKETCH_19_W, SKETCH_19_H)
    extrude(amount=-EXTRUDE_8_DEPTH)

    # 草图20 → 切除-拉伸17 (cut)
    with BuildSketch(Plane.XY.offset(5)):
        with Locations((91, -19.65)):
            Rectangle(SKETCH_20_W, SKETCH_20_H)
        with Locations((81, -74)):
            Rectangle(SKETCH_20_W_2, SKETCH_20_H_2)
    extrude(amount=-CUT_EXTRUDE_17_DEPTH, mode=Mode.SUBTRACT)

    # 草图21 → 切除-拉伸18 (cut, through all)
    with BuildSketch(Plane.XY.offset(3)):
        with BuildLine():
            ThreePointArc((60.5, -5.3), (60.060660172, -4.239339828), (59, -3.8))
            Line((59, -3.8), (59, -5.3))
            Line((59, -5.3), (57.5, -5.3))
            ThreePointArc((57.5, -5.3), (59, -6.8), (60.5, -5.3))
        make_face()
        with BuildLine():
            Line((59, -5.3), (59, -3.8))
            ThreePointArc((59, -3.8), (57.939339828, -4.239339828), (57.5, -5.3))
            Line((57.5, -5.3), (59, -5.3))
        make_face()
        with Locations((59, -34)):
            Circle(SKETCH_21_R)
        with Locations((123, -34)):
            Circle(SKETCH_21_R)
        with Locations((123, -5.3)):
            Circle(SKETCH_21_R)
        with Locations((93, -69)):
            Circle(SKETCH_21_R)
        with Locations((69, -79)):
            Circle(SKETCH_21_R)
        with Locations((93, -79)):
            Circle(SKETCH_21_R)
        with Locations((69, -69)):
            Circle(SKETCH_21_R)
    extrude(amount=-CUT_EXTRUDE_18_DEPTH, mode=Mode.SUBTRACT)

    # 草图22 → 凸台-拉伸10 (add)
    with BuildSketch(Plane.XY.offset(3)):
        with Locations((123, -5.3)):
            Circle(SKETCH_22_R)
        with Locations((123, -34)):
            Circle(SKETCH_22_R)
    extrude(amount=-EXTRUDE_10_DEPTH)

    # 草图23 → 切除-拉伸19 (cut, through all)
    with BuildSketch(Plane.XY.offset(3)):
        with BuildLine():
            ThreePointArc((125, -5.3), (124.560660172, -4.239339828), (123.5, -3.8))
            Line((123.5, -3.8), (123.5, -5.3))
            Line((123.5, -5.3), (125, -5.3))
        make_face()
        with BuildLine():
            Line((123.5, -5.3), (123.5, -3.8))
            ThreePointArc((123.5, -3.8), (122.439339828, -6.360660172), (125, -5.3))
            Line((125, -5.3), (123.5, -5.3))
        make_face()
        with Locations((123.5, -34)):
            Circle(SKETCH_23_R)
    extrude(amount=-CUT_EXTRUDE_19_DEPTH, mode=Mode.SUBTRACT)

    # 草图24 → 凸台-拉伸11 (add)
    with BuildSketch(Plane.XY.offset(5)):
        with Locations((91, -19.65)):
            Rectangle(SKETCH_24_W, SKETCH_24_H)
        with Locations((59, -5.3)):
            Circle(SKETCH_24_R, mode=Mode.SUBTRACT)
        with Locations((123.5, -5.3)):
            Circle(SKETCH_24_R, mode=Mode.SUBTRACT)
        with Locations((123.5, -34)):
            Circle(SKETCH_24_R, mode=Mode.SUBTRACT)
        with Locations((59, -34)):
            Circle(SKETCH_24_R, mode=Mode.SUBTRACT)
    extrude(amount=-EXTRUDE_11_DEPTH)

    # 草图26 → 凸台-拉伸12 (add)
    with BuildSketch(Plane.XY.offset(5)):
        with Locations((81, -74)):
            Rectangle(SKETCH_26_W, SKETCH_26_H)
        with Locations((69, -69)):
            Circle(SKETCH_26_R, mode=Mode.SUBTRACT)
        with Locations((69, -79)):
            Circle(SKETCH_26_R, mode=Mode.SUBTRACT)
        with Locations((93, -79)):
            Circle(SKETCH_26_R, mode=Mode.SUBTRACT)
        with Locations((93, -69)):
            Circle(SKETCH_26_R, mode=Mode.SUBTRACT)
    extrude(amount=-EXTRUDE_12_DEPTH)

    # 草图27 → 切除-拉伸22 (cut)
    with BuildSketch(Plane.XY.offset(5)):
        with Locations((25.5, 4)):
            Rectangle(SKETCH_27_W, SKETCH_27_H)
        with Locations((25.5, -60)):
            Rectangle(SKETCH_27_W, SKETCH_27_H)
    extrude(amount=-CUT_EXTRUDE_22_DEPTH, mode=Mode.SUBTRACT)

    # 草图29 → 切除-拉伸24 (cut)
    with BuildSketch(Plane.XY.offset(5)):
        with Locations((91.25, -52)):
            Rectangle(SKETCH_29_W, SKETCH_29_H)
    extrude(amount=-CUT_EXTRUDE_24_DEPTH, mode=Mode.SUBTRACT)


solid = part.part
